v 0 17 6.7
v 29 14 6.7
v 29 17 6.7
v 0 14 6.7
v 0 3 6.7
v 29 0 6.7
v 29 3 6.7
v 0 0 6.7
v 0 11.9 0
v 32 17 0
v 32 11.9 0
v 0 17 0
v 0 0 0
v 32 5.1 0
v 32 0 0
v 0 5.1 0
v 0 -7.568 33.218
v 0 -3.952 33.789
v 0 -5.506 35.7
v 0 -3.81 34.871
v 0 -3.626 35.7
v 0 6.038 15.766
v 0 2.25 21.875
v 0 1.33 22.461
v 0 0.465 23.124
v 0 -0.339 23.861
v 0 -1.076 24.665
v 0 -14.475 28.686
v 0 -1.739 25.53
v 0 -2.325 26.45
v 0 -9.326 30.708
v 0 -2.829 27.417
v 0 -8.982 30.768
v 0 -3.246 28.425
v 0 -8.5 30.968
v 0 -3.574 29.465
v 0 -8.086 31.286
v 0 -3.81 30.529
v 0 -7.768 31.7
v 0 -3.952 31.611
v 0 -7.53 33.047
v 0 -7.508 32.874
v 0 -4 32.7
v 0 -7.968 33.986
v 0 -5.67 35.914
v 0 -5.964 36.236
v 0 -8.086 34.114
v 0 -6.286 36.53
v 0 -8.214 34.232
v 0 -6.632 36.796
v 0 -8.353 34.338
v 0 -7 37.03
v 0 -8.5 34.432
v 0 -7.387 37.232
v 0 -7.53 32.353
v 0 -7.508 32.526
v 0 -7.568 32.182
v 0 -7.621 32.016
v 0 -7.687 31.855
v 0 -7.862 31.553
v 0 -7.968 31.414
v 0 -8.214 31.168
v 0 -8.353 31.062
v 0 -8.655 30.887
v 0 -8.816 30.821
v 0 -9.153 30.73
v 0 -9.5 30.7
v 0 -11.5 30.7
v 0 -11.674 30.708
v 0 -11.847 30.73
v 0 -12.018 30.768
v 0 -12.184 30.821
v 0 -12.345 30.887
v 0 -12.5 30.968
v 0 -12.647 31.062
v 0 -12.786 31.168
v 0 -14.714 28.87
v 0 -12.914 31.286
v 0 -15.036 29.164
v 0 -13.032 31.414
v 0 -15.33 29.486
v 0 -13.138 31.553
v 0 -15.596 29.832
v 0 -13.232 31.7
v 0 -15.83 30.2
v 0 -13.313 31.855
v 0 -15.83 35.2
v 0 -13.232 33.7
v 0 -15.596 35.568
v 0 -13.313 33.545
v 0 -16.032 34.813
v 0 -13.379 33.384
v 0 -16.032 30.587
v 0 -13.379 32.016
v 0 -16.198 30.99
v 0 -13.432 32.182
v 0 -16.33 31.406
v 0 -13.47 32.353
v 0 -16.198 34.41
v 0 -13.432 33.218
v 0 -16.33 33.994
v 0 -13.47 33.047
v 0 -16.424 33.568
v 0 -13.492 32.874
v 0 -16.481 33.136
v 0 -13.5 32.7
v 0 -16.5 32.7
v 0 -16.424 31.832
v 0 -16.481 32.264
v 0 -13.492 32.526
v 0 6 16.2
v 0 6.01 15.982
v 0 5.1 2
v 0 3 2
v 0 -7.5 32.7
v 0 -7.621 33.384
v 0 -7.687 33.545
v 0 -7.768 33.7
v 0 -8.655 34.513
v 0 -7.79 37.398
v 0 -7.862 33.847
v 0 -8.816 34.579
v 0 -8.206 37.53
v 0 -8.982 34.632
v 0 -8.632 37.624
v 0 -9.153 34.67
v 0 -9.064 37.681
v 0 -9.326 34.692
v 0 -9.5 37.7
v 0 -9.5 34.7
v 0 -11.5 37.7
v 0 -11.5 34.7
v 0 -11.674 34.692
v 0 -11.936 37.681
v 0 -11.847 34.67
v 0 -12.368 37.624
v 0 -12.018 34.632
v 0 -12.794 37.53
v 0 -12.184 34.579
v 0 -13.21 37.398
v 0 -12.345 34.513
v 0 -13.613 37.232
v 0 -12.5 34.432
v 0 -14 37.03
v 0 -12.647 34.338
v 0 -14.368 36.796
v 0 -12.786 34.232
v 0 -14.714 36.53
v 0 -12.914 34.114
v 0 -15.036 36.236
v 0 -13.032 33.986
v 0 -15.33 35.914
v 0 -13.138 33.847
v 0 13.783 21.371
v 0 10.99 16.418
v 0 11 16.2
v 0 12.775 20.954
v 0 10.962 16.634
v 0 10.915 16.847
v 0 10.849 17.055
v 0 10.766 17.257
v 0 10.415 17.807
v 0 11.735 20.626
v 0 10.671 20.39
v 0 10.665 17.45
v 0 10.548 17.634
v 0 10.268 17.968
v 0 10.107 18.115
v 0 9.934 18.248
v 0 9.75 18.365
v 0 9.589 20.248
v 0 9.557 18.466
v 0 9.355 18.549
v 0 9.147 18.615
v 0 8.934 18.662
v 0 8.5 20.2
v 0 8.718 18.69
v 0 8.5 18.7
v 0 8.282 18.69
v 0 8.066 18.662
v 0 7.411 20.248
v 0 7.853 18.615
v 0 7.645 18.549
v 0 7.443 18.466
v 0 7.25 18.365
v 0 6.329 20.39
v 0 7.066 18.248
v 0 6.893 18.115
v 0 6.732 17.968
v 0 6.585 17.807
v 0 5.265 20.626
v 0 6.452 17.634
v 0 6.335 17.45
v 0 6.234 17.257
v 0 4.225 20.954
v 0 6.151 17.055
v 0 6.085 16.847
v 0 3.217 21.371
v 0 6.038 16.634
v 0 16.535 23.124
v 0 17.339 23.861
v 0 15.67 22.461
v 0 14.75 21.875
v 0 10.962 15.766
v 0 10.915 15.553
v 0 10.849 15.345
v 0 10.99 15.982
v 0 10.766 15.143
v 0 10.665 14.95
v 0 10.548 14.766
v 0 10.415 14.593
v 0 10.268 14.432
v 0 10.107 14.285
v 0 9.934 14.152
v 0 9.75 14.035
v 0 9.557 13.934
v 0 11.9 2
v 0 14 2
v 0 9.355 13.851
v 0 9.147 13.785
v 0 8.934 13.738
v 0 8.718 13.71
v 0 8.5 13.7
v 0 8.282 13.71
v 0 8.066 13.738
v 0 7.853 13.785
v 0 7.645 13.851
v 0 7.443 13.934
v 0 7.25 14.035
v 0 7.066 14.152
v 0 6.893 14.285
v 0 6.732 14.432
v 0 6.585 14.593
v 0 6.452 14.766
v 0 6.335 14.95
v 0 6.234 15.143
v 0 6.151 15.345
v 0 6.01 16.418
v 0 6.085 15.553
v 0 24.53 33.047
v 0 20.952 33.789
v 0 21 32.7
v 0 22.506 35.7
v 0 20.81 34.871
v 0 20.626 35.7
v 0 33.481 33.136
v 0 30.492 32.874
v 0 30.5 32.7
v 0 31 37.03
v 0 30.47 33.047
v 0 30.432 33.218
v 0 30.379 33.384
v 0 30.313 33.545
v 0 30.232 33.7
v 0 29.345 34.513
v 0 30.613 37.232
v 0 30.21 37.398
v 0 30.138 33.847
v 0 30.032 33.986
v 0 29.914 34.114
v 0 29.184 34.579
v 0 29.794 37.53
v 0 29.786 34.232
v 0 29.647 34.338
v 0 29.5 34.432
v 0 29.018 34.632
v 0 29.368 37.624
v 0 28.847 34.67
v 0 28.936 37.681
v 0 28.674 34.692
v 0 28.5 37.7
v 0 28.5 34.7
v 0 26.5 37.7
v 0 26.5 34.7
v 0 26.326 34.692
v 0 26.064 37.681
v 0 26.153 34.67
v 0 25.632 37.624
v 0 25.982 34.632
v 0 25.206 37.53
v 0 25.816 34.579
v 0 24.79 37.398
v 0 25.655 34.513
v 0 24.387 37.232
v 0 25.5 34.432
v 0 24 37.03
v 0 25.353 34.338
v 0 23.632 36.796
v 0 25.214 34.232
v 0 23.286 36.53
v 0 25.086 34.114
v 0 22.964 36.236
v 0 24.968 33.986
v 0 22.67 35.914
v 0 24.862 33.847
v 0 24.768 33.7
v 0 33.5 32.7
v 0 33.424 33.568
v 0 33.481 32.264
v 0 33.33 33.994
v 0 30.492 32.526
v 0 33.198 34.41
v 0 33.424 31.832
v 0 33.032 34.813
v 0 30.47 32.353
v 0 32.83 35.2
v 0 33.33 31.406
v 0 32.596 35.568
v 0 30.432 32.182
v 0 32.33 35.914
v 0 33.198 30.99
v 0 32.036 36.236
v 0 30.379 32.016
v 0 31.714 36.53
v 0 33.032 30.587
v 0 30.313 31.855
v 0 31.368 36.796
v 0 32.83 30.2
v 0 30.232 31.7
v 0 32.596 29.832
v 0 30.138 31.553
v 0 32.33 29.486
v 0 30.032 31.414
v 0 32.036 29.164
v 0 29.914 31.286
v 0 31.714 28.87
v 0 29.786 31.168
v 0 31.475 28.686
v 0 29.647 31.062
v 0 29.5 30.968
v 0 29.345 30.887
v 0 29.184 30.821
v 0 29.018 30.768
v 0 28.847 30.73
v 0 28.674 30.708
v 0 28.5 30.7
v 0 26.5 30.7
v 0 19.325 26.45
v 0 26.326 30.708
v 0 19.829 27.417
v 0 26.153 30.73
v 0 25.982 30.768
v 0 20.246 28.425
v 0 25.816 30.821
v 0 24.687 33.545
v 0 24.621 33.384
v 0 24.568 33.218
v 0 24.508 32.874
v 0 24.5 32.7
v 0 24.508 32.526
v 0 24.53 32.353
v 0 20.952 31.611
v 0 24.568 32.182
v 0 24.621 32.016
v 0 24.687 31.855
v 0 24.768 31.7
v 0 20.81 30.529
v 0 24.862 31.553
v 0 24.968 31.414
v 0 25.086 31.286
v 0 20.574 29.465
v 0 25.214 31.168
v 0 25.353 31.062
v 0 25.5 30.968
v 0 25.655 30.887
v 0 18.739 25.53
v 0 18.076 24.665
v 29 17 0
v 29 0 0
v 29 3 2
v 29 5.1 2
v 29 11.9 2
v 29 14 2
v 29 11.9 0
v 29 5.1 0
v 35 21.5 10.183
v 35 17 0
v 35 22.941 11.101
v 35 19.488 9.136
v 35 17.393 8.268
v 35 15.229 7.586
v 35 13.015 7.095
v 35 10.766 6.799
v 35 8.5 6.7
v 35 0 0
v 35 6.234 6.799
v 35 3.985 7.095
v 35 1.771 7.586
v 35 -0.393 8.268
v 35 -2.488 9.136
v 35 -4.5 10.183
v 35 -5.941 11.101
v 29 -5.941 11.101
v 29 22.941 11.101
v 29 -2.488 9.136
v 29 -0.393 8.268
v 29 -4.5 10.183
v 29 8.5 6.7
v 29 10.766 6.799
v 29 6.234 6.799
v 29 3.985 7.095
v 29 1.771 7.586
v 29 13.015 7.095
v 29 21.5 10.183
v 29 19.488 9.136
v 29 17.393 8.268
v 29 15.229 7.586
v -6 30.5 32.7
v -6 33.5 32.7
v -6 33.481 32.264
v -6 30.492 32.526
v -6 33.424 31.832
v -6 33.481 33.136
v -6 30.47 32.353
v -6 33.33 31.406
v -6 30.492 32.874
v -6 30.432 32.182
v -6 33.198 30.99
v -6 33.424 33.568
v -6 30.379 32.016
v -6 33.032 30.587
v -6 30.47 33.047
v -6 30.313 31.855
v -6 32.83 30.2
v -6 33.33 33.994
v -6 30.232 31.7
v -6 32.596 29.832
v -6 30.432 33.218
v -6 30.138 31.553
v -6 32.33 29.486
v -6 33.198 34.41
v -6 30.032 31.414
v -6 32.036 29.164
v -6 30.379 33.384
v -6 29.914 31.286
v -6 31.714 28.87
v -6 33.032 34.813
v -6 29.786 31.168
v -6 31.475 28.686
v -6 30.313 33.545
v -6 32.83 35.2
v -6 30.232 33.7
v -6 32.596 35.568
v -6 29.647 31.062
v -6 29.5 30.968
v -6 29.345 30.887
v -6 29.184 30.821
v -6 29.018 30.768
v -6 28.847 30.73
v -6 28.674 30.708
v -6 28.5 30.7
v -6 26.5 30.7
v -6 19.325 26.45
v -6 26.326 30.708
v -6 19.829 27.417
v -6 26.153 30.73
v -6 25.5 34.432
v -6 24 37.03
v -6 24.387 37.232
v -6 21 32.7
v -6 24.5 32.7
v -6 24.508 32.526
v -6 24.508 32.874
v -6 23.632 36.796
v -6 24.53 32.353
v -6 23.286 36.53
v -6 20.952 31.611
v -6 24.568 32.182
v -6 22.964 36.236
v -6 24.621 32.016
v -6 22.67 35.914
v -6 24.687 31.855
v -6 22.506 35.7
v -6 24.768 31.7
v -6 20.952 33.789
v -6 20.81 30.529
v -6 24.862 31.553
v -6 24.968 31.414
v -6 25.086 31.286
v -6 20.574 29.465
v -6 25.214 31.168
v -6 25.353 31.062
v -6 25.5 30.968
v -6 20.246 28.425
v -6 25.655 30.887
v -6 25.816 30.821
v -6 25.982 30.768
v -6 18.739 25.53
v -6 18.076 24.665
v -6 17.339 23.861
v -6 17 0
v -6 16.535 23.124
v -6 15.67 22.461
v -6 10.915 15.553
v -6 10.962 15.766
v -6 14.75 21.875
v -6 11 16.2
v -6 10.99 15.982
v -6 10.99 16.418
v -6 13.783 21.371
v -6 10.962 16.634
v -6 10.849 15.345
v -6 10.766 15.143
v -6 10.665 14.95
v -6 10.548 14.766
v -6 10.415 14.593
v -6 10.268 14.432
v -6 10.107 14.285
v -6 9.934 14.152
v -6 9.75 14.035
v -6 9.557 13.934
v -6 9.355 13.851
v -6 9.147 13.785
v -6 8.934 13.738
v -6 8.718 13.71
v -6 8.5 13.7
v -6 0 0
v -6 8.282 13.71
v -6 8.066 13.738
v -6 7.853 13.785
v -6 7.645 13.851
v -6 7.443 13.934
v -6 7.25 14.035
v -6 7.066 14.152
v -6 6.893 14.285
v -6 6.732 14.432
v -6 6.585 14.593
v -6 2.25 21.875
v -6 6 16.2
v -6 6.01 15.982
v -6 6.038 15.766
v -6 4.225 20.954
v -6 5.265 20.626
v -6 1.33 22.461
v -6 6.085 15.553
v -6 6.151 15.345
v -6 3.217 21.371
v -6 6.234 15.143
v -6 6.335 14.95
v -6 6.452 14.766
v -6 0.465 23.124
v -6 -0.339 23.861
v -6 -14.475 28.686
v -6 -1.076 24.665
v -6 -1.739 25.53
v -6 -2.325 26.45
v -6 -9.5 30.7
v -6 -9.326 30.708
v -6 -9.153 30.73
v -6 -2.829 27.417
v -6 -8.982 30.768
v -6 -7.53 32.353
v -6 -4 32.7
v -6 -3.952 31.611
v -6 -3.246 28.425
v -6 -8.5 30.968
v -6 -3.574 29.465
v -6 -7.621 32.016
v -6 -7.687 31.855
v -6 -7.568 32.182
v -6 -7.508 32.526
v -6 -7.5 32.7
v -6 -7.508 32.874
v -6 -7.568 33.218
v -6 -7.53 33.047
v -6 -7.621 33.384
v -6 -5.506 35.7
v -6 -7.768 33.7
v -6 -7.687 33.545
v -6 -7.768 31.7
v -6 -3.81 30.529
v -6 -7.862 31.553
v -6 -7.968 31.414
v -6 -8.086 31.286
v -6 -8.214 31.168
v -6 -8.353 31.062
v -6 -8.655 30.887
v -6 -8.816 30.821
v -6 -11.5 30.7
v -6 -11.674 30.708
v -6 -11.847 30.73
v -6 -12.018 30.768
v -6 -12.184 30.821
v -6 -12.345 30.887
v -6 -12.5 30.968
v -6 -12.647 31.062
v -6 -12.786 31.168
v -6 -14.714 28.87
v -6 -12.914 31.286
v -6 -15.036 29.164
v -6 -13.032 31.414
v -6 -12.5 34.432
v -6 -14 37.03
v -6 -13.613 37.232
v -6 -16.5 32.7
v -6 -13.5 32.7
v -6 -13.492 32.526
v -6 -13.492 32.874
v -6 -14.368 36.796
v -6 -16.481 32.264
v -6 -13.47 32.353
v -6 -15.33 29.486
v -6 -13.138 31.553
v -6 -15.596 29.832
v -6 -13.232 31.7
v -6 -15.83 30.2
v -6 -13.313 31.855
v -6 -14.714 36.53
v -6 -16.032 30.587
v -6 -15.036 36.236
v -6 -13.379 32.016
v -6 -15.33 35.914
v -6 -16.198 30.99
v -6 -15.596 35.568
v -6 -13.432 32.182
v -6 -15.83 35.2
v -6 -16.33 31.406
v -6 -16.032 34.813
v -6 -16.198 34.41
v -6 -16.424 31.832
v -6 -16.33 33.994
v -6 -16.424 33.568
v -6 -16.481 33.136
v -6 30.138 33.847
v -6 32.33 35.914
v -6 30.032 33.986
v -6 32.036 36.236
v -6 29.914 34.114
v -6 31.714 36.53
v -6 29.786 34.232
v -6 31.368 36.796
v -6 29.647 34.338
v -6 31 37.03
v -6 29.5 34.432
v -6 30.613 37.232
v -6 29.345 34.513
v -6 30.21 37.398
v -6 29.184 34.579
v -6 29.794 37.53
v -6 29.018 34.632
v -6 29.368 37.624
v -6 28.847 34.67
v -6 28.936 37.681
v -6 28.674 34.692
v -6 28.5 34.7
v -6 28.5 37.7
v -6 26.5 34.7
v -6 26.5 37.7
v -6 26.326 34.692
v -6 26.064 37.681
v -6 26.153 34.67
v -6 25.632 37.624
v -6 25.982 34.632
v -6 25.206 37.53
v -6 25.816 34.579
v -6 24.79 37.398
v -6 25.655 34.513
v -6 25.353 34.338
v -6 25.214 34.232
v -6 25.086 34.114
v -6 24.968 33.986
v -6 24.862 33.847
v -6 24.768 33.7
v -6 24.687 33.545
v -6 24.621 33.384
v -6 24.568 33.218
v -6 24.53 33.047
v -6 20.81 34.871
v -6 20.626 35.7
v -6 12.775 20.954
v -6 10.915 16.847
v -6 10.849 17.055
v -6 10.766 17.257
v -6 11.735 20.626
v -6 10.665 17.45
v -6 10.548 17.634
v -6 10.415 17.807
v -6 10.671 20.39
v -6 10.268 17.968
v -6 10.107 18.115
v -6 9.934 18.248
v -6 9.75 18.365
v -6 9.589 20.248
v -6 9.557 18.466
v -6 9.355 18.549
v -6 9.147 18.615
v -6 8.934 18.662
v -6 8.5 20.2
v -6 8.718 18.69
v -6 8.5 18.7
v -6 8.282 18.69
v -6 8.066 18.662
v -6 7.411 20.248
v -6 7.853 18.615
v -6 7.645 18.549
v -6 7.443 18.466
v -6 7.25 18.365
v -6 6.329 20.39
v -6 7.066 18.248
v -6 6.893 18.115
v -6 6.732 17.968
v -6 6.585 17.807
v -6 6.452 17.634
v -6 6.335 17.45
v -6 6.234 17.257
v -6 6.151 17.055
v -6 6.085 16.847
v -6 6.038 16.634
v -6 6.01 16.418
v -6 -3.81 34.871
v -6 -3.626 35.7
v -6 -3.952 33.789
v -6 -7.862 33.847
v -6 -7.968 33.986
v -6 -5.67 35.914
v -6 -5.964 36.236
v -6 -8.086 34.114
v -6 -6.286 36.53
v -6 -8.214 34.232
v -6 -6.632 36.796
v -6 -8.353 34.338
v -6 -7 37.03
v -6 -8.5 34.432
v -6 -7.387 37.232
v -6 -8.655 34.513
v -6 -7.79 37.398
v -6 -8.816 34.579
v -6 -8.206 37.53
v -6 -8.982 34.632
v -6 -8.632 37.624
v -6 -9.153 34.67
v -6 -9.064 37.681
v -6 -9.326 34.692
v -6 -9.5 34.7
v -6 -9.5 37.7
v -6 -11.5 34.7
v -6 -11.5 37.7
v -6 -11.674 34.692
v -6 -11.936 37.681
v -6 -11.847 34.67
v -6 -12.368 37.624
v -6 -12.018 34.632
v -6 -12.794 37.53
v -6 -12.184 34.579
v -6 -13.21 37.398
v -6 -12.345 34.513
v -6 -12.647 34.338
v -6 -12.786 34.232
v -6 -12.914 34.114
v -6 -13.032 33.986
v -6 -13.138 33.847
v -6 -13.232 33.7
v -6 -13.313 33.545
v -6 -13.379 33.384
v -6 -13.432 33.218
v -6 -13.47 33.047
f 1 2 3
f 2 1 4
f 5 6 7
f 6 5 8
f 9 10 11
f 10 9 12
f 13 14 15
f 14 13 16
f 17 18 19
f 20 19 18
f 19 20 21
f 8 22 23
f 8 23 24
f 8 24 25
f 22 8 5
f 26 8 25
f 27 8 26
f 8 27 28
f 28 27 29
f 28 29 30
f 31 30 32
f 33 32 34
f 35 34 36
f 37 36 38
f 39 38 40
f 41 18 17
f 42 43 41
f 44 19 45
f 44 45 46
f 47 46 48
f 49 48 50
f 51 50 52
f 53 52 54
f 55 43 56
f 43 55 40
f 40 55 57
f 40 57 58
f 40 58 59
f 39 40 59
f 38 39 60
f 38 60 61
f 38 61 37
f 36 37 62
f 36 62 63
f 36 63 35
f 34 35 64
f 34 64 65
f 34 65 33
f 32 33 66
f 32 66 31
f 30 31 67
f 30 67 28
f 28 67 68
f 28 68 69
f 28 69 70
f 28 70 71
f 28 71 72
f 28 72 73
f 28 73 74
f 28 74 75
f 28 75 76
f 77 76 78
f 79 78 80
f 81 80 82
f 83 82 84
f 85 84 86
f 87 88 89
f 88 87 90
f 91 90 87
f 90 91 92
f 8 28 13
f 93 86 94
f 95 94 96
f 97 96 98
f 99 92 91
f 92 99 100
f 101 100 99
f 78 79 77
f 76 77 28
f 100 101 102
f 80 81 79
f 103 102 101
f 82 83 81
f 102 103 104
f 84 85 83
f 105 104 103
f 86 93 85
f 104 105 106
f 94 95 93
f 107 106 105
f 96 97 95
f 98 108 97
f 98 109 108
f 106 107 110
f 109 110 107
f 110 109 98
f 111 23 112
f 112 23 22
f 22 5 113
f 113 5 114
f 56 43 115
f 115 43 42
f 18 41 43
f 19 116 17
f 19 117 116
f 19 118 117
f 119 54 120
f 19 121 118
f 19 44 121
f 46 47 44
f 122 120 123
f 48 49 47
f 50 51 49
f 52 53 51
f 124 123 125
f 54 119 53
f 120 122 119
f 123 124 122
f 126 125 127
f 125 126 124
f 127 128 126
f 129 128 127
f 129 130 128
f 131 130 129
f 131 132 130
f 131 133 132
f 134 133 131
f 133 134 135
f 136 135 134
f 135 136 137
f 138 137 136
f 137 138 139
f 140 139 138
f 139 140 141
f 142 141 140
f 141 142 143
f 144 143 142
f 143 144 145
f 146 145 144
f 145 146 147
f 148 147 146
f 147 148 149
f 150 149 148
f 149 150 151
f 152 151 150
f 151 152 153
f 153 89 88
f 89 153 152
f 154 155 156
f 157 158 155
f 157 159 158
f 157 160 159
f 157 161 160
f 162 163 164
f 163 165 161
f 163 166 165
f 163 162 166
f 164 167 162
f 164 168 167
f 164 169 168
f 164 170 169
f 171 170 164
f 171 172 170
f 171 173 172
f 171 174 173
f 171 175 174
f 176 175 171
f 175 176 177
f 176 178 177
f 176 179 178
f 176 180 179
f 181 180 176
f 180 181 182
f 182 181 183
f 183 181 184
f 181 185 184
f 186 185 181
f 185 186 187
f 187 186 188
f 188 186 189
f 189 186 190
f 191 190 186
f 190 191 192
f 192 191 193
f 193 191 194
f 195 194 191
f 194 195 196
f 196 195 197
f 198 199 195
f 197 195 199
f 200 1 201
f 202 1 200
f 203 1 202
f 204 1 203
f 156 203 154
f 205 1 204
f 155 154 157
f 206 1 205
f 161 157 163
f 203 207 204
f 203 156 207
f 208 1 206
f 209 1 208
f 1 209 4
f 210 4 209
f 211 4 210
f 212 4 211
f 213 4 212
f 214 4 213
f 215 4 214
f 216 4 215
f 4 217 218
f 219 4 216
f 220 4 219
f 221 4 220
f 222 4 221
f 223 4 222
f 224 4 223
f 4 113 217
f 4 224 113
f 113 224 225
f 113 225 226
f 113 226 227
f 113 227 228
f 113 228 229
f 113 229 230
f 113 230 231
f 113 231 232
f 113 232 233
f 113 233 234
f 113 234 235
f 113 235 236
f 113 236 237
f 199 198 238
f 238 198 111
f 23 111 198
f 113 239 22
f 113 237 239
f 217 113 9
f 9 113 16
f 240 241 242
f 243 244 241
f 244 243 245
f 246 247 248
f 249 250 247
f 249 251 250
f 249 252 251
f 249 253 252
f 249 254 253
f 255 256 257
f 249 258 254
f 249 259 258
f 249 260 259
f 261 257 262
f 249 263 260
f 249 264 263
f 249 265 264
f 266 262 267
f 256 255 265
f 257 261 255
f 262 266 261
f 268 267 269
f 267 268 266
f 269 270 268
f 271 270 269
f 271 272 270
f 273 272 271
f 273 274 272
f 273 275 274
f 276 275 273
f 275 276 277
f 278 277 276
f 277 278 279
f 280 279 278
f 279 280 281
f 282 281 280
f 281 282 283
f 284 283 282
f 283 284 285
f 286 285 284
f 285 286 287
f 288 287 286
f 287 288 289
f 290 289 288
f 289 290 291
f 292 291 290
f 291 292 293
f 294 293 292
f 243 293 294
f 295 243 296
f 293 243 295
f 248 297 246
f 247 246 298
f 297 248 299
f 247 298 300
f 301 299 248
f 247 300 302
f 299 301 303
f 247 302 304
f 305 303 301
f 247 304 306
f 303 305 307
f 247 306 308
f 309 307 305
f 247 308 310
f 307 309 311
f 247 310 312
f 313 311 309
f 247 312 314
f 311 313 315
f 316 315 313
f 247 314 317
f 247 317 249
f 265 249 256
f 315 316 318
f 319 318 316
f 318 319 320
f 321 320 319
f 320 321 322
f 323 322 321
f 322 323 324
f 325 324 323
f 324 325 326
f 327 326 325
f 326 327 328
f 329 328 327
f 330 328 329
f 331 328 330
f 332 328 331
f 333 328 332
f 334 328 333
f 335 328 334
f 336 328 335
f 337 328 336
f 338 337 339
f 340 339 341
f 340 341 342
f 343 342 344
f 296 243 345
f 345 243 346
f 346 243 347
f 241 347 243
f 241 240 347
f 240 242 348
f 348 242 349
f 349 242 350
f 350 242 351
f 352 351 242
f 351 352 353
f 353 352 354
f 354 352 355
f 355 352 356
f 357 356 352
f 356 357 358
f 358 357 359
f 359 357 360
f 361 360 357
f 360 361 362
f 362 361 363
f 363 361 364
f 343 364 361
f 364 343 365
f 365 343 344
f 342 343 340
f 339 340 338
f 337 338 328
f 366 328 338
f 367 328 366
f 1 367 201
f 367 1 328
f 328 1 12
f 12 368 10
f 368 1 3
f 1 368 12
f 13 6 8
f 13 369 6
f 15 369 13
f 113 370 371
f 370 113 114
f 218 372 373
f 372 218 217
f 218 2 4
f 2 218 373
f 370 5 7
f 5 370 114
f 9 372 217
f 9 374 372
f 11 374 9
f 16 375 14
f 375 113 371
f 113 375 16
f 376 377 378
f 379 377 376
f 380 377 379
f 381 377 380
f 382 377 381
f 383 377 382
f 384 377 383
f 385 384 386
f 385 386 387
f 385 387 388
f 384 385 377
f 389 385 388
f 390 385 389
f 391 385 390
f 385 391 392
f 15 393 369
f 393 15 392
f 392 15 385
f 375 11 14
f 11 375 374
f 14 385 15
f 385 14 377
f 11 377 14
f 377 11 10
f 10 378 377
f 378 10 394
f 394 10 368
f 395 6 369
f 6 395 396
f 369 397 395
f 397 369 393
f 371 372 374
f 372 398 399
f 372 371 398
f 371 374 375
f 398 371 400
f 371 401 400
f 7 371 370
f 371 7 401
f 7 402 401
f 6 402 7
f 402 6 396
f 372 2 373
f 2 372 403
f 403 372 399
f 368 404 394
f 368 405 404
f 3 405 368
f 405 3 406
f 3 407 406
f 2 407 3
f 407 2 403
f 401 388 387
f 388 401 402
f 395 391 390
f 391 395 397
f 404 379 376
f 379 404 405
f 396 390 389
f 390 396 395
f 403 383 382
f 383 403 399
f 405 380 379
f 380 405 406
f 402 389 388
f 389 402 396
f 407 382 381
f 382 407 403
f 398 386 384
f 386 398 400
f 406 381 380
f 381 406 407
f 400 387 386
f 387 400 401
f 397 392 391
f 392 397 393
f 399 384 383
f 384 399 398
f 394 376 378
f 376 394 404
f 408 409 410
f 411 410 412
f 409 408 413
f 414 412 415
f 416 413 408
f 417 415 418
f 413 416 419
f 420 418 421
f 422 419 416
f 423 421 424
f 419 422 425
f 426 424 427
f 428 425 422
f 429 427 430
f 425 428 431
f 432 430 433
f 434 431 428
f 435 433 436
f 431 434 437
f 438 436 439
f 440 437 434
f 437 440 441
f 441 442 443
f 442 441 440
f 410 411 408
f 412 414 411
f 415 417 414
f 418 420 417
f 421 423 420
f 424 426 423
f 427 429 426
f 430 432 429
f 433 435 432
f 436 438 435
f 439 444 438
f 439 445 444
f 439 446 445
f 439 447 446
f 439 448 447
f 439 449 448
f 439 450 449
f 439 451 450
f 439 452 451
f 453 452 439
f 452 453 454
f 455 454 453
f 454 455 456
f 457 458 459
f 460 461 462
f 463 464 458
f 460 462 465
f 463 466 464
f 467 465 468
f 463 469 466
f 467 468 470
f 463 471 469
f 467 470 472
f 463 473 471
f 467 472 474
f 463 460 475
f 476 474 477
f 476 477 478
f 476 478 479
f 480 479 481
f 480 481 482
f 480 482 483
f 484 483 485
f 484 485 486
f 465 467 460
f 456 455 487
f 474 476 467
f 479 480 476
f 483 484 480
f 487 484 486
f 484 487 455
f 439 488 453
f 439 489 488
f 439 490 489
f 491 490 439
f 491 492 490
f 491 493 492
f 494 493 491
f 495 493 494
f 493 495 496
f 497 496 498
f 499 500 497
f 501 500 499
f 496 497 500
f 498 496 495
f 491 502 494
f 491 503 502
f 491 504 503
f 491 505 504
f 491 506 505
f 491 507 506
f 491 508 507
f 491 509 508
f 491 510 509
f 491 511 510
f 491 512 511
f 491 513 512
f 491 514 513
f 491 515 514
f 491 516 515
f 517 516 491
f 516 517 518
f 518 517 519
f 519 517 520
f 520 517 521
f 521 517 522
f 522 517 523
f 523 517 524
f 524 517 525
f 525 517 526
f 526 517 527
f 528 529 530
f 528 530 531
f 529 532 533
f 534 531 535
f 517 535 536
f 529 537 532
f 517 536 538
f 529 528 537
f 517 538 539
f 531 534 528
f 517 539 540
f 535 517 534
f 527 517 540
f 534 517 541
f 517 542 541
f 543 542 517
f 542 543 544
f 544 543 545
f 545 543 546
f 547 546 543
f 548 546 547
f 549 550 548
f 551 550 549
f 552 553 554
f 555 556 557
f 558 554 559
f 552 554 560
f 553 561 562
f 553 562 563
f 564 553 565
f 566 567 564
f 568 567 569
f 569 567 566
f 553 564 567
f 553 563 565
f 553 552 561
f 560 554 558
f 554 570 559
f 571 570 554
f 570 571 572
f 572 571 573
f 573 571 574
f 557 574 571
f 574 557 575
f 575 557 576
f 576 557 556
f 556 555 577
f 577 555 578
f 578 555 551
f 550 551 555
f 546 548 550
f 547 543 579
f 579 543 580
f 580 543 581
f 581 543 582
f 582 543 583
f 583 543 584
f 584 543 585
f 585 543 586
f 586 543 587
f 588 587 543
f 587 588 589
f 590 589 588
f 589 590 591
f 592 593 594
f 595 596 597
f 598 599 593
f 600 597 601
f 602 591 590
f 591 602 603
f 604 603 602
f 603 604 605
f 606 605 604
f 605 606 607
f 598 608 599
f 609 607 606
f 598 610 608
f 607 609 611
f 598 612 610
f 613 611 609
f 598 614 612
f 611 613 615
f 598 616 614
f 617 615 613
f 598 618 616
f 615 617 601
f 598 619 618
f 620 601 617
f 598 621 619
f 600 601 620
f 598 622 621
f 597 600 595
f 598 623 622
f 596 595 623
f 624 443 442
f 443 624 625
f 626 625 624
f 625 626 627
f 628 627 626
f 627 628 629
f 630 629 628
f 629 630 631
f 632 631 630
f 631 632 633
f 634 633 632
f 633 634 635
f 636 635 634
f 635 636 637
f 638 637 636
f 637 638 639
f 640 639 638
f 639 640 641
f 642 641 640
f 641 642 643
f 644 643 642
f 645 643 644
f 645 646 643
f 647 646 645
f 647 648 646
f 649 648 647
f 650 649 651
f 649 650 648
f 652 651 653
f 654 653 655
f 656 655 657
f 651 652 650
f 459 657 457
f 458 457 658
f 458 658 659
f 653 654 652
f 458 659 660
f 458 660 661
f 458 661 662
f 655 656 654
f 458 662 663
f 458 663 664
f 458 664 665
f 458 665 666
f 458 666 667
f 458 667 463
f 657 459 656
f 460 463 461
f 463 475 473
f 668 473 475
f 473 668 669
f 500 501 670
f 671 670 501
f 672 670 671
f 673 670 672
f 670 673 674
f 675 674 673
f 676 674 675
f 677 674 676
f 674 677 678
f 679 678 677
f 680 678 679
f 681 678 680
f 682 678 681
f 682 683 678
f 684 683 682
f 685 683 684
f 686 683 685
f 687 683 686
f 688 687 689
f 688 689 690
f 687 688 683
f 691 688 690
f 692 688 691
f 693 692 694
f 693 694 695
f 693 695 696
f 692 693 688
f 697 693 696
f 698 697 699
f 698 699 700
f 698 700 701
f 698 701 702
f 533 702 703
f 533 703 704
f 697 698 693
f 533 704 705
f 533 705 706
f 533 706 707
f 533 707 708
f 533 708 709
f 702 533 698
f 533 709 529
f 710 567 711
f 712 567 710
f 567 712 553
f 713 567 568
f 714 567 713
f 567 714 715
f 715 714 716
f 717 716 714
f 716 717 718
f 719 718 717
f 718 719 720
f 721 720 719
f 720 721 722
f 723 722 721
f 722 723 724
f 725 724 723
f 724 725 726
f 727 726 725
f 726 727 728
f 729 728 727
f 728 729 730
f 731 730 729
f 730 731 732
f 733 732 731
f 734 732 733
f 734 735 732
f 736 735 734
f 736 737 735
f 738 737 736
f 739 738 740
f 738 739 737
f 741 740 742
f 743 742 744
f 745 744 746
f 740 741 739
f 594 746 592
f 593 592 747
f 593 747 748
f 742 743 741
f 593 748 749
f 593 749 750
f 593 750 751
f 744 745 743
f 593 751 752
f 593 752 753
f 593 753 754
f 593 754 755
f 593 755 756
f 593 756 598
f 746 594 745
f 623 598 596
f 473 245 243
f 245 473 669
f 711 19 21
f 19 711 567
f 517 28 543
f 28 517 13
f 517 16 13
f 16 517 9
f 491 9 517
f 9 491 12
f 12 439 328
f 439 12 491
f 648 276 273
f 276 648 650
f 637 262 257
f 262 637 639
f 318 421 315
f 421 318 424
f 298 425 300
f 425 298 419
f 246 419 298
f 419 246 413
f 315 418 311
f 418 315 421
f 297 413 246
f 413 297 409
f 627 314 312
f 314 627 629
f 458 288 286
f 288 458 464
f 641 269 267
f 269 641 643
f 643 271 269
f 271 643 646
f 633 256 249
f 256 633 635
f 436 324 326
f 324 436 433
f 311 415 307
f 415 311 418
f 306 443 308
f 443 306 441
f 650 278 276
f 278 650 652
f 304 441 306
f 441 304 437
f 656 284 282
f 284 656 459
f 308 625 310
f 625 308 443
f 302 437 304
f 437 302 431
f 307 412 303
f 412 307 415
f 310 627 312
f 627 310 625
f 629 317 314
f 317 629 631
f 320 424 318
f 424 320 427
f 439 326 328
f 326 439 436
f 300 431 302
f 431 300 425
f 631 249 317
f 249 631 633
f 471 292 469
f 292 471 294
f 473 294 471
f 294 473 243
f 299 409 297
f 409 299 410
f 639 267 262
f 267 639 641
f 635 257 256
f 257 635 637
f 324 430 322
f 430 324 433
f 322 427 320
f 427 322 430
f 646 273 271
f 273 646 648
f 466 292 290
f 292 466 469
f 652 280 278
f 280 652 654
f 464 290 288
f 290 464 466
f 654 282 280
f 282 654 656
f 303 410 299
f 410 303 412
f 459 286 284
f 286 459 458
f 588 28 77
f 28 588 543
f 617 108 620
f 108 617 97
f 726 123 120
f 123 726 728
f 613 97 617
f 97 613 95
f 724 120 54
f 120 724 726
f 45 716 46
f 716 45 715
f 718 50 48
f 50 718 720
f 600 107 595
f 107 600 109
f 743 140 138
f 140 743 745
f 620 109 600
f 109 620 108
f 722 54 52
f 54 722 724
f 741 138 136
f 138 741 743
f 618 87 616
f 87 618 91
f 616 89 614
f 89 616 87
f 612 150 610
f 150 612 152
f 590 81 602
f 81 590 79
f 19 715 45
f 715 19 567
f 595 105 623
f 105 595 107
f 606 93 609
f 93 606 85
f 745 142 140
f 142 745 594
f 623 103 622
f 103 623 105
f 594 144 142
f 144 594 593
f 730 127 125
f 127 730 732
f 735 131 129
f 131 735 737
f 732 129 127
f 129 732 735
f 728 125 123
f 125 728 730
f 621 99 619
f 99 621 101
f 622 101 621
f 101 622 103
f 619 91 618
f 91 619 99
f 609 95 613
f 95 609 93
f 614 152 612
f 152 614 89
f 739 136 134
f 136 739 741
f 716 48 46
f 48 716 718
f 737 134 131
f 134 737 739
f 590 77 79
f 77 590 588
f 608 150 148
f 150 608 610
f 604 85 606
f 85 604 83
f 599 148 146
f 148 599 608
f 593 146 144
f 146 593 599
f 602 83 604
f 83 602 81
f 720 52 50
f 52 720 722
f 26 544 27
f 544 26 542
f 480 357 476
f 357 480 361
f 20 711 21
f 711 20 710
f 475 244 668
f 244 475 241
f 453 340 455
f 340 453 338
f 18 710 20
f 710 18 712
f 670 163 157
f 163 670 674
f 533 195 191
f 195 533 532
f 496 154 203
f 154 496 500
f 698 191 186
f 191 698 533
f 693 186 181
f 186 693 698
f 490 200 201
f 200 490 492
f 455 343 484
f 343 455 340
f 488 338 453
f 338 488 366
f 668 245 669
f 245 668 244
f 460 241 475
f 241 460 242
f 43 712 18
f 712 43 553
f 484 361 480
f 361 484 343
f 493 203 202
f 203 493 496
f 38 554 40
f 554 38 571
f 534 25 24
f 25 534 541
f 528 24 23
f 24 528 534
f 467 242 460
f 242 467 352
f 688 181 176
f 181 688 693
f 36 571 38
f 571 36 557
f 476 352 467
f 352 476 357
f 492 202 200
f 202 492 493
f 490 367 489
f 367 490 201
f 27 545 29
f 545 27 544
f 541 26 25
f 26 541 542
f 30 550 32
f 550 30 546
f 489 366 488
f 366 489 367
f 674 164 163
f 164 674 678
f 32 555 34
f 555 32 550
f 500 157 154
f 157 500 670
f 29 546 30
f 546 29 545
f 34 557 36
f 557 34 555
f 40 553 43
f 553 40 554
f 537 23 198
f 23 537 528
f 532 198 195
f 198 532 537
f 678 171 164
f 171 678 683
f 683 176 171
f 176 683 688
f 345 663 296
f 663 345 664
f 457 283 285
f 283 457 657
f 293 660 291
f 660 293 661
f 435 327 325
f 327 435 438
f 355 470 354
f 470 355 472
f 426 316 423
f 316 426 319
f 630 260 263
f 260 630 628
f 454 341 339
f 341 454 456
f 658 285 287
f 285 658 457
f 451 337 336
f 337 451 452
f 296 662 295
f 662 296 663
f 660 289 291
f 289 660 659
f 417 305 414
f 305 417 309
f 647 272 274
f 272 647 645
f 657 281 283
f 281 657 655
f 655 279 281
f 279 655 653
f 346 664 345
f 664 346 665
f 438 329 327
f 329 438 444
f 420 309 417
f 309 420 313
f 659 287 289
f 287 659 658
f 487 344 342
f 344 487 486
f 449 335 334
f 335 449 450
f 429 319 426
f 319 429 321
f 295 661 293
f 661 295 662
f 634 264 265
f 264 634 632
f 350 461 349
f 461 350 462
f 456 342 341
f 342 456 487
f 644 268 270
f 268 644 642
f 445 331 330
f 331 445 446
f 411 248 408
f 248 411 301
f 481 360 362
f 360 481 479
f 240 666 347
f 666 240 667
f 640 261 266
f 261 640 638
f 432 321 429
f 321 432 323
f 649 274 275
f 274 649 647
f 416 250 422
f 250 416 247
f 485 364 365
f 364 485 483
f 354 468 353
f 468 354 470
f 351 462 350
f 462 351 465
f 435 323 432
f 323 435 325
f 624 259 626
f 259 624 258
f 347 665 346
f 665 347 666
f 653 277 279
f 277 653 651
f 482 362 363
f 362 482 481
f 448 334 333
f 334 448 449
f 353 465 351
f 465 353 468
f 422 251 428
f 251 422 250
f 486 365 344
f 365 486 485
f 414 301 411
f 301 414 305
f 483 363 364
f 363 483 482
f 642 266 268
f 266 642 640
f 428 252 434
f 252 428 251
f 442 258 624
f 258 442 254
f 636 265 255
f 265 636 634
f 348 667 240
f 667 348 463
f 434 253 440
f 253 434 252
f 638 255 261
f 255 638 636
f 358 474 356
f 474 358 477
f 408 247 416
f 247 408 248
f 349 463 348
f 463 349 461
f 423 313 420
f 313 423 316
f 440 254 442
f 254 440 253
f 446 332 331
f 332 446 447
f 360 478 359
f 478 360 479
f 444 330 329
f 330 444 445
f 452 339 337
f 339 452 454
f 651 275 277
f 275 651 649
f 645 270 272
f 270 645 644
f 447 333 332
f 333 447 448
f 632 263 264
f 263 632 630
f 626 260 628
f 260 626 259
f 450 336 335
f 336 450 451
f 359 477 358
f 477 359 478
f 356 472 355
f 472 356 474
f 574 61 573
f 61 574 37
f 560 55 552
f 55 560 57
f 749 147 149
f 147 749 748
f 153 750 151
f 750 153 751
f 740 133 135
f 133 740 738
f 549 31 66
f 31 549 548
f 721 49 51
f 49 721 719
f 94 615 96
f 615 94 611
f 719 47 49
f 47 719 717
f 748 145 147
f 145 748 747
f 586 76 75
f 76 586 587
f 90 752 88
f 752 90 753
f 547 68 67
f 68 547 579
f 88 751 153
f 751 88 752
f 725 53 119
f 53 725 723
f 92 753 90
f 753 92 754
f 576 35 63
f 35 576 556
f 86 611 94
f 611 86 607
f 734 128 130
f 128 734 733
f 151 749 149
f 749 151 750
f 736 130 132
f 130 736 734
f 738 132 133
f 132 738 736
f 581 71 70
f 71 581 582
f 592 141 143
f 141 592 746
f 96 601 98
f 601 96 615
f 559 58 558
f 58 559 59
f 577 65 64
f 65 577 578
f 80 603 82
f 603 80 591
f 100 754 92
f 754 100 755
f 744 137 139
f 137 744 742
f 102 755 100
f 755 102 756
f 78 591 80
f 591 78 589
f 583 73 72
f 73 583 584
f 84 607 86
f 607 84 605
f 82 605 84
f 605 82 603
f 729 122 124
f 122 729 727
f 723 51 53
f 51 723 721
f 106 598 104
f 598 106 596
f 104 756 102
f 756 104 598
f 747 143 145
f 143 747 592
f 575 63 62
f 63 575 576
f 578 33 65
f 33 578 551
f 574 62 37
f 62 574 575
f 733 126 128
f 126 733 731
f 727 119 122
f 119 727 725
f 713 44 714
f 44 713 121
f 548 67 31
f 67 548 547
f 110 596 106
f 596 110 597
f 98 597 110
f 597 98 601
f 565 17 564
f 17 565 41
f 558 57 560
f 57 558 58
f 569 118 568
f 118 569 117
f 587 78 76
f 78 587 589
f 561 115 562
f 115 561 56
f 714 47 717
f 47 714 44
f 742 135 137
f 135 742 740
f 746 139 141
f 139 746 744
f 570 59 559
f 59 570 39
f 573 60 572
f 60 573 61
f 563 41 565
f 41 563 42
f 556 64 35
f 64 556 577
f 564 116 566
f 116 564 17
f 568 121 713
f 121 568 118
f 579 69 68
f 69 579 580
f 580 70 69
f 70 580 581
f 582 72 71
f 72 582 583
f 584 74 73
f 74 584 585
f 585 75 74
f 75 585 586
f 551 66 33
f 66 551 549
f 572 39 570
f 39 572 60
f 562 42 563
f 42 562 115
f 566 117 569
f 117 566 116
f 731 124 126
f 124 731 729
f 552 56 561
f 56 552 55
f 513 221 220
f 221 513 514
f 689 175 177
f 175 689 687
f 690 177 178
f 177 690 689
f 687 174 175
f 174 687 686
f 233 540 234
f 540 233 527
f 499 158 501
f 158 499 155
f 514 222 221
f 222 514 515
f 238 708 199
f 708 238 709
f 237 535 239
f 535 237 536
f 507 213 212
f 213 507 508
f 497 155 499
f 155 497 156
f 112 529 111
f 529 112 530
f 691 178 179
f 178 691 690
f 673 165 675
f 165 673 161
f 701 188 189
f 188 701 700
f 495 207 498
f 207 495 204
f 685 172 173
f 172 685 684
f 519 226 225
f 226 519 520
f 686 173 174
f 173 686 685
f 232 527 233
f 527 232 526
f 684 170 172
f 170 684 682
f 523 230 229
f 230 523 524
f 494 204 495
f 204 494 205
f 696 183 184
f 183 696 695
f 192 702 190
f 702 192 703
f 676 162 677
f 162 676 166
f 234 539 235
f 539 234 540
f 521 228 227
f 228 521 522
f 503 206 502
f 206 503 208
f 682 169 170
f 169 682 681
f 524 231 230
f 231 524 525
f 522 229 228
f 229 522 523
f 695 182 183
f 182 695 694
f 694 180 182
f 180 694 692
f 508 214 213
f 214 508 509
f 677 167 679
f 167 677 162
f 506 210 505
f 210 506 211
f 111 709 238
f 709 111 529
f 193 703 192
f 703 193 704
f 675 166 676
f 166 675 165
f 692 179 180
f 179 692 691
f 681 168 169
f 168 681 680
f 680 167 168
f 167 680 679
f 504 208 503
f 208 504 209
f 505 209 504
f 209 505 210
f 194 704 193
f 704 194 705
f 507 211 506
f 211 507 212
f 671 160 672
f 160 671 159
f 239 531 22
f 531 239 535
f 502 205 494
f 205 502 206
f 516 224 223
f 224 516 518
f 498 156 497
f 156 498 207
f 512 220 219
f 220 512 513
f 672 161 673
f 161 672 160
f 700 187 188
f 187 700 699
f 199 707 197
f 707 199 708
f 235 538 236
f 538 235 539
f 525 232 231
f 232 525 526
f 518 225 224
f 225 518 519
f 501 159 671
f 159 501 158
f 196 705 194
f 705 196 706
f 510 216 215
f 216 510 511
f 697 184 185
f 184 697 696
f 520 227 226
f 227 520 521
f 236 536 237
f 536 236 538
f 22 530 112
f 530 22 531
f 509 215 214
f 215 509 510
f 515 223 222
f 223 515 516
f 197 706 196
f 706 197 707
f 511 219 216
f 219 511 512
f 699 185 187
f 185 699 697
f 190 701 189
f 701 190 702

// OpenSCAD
Gap = 0.2;
$fn = 72;

FrameToMotorAdapter();

module FrameToMotorAdapter() {
    Padding = 3.0;

    MotorInnerRadius = 12.5;
    MotorBraceRadius = MotorInnerRadius + Padding;

    SupportHeight = 6.0;
    MotorRadius = 26.0;

    HeadDiameter = 11.0;
    HeadHeight = 4.5 + Gap;

    ThreadDiameter = 6.6 + Gap; // I measured 6.2, but RodToBearingCoupling uses 6.5 for a snug fit
    ThreadHeight = 2.0;

    FrameAdapterWidth = HeadDiameter + 2*Padding;
    FrameAdapterLength = 32;
    FrameAdapterHeight = ThreadHeight + HeadHeight;

    BearingAdapterOffset = MotorRadius + FrameAdapterHeight; // Center of the rod
    BearingAdapterShift = 0;

    GuideRodSnugRadius = 2.5;
    GuideRodOffset = MotorInnerRadius + Padding/2 + GuideRodSnugRadius;

    MountingNutOffset = 19;
    MountingNutRadius = 2.0;

    ToTheSky = 50;

    union() {
        // Frame adapter
        difference() {
            cube([FrameAdapterLength, FrameAdapterWidth, FrameAdapterHeight]);

            // Volume of the nut head
            translate([0, Padding, ThreadHeight])
                cube([FrameAdapterLength, HeadDiameter, HeadHeight]);

            // Volume of the nut thread
            translate([0, Padding + (HeadDiameter - ThreadDiameter)/2, 0])
                cube([FrameAdapterLength, ThreadDiameter, ThreadHeight]);
        }

        // Motor housing adapter
        rotate([0, -90, 0])
        translate([BearingAdapterOffset, FrameAdapterWidth/2, -FrameAdapterLength])
        difference() {
            union()
            {
                // Resting arm
                translate([-BearingAdapterOffset/2, 0, 0])
                linear_extrude(height = SupportHeight, center = true)
                    polygon(points = [
                    [-BearingAdapterOffset/2, -FrameAdapterWidth/2],
                    [BearingAdapterOffset/2, -MotorRadius],
                    [BearingAdapterOffset/2, MotorRadius],
                    [-BearingAdapterOffset/2, FrameAdapterWidth/2],
                    ]);
            }
            union() {
                // Volume of motor housing
                cylinder(r = MotorRadius, h=SupportHeight, center=true);
            }
        }

        // Motor adapter
        rotate([0, -90, 0])
        translate([BearingAdapterOffset, FrameAdapterWidth/2, -BearingAdapterShift +SupportHeight/2])
        difference() {
            union()
            {
                // Bearing adapter
                difference()
                {
                    cylinder(r = MotorBraceRadius, h=SupportHeight, center=true);
                    // Remove top half (-Padding)
                    translate([Padding, -ToTheSky/2, -ToTheSky/2])
                        cube([ToTheSky, ToTheSky, ToTheSky]);
                }
                
                // Connection to frame adapter
                translate([-BearingAdapterOffset/2, 0, 0])
                linear_extrude(height = SupportHeight, center = true)
                    polygon(points = [
                    [-BearingAdapterOffset/2, -FrameAdapterWidth/2],
                    [BearingAdapterOffset/2, -(MountingNutOffset+MountingNutRadius*1.5+Padding)],
                    [BearingAdapterOffset/2, (MountingNutOffset+MountingNutRadius*1.5+Padding)],
                    [-BearingAdapterOffset/2, FrameAdapterWidth/2],
                    ]);

                // Mounting nut support
                translate([0, MountingNutOffset, 0])
                hull()
                {
                    translate([0, -MountingNutRadius/2, 0])
                        cylinder(r = MountingNutRadius + Padding, h=SupportHeight, center=true);
                    translate([0, MountingNutRadius/2, 0])
                        cylinder(r = MountingNutRadius + Padding, h=SupportHeight, center=true);
                }
                translate([0, -MountingNutOffset, 0])
                hull()
                {
                    translate([0, -MountingNutRadius/2, 0])
                        cylinder(r = MountingNutRadius + Padding, h=SupportHeight, center=true);
                    translate([0, MountingNutRadius/2, 0])
                        cylinder(r = MountingNutRadius + Padding, h=SupportHeight, center=true);
                }
            }
            union() {
                // Volume of motor
                translate([0, 0, 0])
                    cylinder(r = MotorInnerRadius, h=SupportHeight, center=true);

                // Mounting nuts
                translate([0, MountingNutOffset, 0])
                hull()
                {
                    translate([0, -MountingNutRadius/2, 0])
                        cylinder(r = MountingNutRadius, h=SupportHeight, center=true);
                    translate([0, MountingNutRadius/2, 0])
                        cylinder(r = MountingNutRadius, h=SupportHeight, center=true);
                }
                    
                translate([0, -MountingNutOffset, 0])
                hull()
                {
                    translate([0, -MountingNutRadius/2, 0])
                        cylinder(r = MountingNutRadius, h=SupportHeight, center=true);
                    translate([0, MountingNutRadius/2, 0])
                        cylinder(r = MountingNutRadius, h=SupportHeight, center=true);
                }

                // Guide rod
                translate([-GuideRodOffset, 0, -(SupportHeight + Padding)/2])
                    cylinder(r = GuideRodSnugRadius, h = SupportHeight + Padding);
            }
        }
    }
}
